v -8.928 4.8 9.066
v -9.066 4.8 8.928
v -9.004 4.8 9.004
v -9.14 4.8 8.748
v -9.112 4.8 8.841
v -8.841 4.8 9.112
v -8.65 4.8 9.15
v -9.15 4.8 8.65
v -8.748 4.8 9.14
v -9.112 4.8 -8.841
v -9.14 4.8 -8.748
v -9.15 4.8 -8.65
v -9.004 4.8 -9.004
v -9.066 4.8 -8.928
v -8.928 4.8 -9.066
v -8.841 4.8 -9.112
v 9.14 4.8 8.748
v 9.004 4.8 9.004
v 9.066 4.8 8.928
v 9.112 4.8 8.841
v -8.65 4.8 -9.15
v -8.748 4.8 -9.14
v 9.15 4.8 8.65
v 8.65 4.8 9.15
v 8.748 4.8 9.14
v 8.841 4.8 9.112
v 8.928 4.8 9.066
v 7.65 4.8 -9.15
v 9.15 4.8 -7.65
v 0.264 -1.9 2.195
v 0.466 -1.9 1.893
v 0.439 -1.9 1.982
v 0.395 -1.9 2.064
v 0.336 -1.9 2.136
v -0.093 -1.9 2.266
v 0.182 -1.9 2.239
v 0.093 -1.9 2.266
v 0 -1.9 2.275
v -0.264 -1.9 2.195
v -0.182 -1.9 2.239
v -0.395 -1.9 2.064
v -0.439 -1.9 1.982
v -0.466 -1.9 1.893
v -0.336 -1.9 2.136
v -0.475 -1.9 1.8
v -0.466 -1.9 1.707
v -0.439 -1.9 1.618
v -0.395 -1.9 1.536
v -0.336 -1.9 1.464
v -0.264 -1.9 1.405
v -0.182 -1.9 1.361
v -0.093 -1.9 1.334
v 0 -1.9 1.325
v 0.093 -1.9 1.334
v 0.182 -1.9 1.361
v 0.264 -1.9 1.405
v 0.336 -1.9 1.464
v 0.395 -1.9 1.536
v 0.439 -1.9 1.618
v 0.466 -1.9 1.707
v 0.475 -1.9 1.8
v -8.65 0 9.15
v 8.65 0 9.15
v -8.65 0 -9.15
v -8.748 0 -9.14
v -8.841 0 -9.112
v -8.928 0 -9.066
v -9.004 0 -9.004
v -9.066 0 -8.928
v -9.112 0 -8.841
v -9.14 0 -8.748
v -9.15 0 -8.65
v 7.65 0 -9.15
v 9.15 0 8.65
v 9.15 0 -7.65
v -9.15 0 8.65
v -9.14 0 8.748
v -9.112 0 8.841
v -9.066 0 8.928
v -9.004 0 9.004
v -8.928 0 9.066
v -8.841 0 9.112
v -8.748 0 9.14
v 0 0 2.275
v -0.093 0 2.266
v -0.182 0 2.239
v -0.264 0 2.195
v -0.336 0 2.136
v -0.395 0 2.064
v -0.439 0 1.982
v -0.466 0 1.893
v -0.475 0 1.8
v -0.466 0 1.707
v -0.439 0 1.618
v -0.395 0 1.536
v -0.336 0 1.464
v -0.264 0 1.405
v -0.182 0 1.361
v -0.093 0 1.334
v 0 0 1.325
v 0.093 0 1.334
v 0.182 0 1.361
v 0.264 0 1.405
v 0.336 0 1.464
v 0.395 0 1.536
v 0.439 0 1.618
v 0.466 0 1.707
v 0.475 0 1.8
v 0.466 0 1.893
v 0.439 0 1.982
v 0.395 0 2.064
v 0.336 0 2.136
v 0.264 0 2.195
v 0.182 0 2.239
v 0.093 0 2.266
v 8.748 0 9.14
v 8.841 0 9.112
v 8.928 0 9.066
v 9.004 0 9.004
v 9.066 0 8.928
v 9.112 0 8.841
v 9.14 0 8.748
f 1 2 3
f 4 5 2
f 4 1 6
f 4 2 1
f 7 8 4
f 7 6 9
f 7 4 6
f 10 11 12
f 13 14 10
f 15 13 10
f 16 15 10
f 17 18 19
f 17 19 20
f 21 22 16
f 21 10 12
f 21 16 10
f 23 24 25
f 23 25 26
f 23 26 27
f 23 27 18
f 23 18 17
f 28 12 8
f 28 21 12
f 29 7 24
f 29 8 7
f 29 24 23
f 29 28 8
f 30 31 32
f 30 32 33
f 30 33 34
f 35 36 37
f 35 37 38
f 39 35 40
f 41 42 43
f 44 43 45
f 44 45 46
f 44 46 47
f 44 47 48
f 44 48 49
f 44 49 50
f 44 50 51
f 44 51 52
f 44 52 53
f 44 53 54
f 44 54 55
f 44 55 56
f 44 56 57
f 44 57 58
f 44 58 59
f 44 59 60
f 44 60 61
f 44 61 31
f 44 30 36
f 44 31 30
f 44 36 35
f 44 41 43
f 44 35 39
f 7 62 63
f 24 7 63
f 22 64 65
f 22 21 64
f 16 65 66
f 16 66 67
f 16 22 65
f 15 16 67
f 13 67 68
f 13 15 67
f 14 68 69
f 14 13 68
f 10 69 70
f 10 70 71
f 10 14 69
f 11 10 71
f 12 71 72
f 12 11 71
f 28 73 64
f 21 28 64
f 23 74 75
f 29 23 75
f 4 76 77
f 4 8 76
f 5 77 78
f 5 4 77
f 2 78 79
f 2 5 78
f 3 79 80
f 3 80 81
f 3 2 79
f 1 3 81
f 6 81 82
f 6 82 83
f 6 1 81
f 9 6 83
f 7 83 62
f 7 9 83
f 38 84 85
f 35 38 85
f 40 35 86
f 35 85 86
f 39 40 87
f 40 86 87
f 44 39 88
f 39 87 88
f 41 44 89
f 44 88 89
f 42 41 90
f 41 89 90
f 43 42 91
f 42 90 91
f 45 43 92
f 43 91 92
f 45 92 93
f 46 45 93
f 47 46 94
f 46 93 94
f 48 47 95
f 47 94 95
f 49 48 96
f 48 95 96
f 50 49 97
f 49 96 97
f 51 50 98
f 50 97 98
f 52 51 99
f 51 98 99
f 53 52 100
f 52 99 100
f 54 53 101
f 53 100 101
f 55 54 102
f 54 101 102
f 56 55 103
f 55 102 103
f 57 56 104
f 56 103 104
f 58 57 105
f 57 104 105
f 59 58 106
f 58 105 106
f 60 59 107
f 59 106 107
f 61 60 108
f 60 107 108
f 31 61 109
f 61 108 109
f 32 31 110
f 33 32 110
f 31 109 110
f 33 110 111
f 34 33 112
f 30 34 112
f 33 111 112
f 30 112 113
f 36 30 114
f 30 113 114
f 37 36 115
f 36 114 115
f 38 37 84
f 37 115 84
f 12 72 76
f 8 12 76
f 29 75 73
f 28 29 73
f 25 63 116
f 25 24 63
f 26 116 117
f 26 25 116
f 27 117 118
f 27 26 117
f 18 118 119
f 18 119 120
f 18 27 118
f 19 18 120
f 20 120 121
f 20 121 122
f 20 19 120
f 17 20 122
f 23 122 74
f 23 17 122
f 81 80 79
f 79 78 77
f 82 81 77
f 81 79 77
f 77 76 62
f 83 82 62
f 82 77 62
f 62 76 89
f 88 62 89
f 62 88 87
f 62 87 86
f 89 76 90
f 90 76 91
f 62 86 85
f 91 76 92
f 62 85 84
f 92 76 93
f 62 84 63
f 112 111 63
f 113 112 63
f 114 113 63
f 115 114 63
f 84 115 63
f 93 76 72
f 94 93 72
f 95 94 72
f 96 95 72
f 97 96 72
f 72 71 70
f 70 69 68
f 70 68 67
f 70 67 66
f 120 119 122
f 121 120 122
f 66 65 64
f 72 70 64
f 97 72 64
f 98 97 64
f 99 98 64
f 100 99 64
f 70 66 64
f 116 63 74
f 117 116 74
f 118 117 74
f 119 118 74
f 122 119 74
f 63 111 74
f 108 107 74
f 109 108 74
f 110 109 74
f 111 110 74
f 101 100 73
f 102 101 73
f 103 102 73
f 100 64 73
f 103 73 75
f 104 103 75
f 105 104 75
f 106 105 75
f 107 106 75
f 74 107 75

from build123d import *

# Parameters (mm, degrees)
BOSS_EXTRUDE1_DEPTH = 4.8
FILLET1_R           = 0.5
SKETCH2_R           = 0.475
BOSS_EXTRUDE2_DEPTH = 1.9


with BuildPart() as part:
    # Sketch1 → Boss-Extrude1 (new body)
    with BuildSketch(Plane(origin=(0, 0, 0), x_dir=(1, 0, 0), z_dir=(0, 1, 0))):
        Polygon((9.15, 7.65), (7.65, 9.15), (-9.15, 9.15), (-9.15, -9.15), (9.15, -9.15), align=None)
    extrude(amount=BOSS_EXTRUDE1_DEPTH)

    # Fillet1
    fillet1_edges = [part.edges().sort_by_distance(p)[0] for p in [
        (-9.15, 2.4, 9.15),
        (-9.15, 2.4, -9.15),
        (9.15, 2.4, 9.15),
    ]]
    fillet(fillet1_edges, radius=FILLET1_R)

    # Sketch2 → Boss-Extrude2 (add)
    with BuildSketch(Plane.XZ):
        with Locations(Location((0, 1.8, 0), (0, 0, 90))):  # turned: the seam where the file's is
            Circle(SKETCH2_R)
    extrude(amount=BOSS_EXTRUDE2_DEPTH)


solid = part.part
